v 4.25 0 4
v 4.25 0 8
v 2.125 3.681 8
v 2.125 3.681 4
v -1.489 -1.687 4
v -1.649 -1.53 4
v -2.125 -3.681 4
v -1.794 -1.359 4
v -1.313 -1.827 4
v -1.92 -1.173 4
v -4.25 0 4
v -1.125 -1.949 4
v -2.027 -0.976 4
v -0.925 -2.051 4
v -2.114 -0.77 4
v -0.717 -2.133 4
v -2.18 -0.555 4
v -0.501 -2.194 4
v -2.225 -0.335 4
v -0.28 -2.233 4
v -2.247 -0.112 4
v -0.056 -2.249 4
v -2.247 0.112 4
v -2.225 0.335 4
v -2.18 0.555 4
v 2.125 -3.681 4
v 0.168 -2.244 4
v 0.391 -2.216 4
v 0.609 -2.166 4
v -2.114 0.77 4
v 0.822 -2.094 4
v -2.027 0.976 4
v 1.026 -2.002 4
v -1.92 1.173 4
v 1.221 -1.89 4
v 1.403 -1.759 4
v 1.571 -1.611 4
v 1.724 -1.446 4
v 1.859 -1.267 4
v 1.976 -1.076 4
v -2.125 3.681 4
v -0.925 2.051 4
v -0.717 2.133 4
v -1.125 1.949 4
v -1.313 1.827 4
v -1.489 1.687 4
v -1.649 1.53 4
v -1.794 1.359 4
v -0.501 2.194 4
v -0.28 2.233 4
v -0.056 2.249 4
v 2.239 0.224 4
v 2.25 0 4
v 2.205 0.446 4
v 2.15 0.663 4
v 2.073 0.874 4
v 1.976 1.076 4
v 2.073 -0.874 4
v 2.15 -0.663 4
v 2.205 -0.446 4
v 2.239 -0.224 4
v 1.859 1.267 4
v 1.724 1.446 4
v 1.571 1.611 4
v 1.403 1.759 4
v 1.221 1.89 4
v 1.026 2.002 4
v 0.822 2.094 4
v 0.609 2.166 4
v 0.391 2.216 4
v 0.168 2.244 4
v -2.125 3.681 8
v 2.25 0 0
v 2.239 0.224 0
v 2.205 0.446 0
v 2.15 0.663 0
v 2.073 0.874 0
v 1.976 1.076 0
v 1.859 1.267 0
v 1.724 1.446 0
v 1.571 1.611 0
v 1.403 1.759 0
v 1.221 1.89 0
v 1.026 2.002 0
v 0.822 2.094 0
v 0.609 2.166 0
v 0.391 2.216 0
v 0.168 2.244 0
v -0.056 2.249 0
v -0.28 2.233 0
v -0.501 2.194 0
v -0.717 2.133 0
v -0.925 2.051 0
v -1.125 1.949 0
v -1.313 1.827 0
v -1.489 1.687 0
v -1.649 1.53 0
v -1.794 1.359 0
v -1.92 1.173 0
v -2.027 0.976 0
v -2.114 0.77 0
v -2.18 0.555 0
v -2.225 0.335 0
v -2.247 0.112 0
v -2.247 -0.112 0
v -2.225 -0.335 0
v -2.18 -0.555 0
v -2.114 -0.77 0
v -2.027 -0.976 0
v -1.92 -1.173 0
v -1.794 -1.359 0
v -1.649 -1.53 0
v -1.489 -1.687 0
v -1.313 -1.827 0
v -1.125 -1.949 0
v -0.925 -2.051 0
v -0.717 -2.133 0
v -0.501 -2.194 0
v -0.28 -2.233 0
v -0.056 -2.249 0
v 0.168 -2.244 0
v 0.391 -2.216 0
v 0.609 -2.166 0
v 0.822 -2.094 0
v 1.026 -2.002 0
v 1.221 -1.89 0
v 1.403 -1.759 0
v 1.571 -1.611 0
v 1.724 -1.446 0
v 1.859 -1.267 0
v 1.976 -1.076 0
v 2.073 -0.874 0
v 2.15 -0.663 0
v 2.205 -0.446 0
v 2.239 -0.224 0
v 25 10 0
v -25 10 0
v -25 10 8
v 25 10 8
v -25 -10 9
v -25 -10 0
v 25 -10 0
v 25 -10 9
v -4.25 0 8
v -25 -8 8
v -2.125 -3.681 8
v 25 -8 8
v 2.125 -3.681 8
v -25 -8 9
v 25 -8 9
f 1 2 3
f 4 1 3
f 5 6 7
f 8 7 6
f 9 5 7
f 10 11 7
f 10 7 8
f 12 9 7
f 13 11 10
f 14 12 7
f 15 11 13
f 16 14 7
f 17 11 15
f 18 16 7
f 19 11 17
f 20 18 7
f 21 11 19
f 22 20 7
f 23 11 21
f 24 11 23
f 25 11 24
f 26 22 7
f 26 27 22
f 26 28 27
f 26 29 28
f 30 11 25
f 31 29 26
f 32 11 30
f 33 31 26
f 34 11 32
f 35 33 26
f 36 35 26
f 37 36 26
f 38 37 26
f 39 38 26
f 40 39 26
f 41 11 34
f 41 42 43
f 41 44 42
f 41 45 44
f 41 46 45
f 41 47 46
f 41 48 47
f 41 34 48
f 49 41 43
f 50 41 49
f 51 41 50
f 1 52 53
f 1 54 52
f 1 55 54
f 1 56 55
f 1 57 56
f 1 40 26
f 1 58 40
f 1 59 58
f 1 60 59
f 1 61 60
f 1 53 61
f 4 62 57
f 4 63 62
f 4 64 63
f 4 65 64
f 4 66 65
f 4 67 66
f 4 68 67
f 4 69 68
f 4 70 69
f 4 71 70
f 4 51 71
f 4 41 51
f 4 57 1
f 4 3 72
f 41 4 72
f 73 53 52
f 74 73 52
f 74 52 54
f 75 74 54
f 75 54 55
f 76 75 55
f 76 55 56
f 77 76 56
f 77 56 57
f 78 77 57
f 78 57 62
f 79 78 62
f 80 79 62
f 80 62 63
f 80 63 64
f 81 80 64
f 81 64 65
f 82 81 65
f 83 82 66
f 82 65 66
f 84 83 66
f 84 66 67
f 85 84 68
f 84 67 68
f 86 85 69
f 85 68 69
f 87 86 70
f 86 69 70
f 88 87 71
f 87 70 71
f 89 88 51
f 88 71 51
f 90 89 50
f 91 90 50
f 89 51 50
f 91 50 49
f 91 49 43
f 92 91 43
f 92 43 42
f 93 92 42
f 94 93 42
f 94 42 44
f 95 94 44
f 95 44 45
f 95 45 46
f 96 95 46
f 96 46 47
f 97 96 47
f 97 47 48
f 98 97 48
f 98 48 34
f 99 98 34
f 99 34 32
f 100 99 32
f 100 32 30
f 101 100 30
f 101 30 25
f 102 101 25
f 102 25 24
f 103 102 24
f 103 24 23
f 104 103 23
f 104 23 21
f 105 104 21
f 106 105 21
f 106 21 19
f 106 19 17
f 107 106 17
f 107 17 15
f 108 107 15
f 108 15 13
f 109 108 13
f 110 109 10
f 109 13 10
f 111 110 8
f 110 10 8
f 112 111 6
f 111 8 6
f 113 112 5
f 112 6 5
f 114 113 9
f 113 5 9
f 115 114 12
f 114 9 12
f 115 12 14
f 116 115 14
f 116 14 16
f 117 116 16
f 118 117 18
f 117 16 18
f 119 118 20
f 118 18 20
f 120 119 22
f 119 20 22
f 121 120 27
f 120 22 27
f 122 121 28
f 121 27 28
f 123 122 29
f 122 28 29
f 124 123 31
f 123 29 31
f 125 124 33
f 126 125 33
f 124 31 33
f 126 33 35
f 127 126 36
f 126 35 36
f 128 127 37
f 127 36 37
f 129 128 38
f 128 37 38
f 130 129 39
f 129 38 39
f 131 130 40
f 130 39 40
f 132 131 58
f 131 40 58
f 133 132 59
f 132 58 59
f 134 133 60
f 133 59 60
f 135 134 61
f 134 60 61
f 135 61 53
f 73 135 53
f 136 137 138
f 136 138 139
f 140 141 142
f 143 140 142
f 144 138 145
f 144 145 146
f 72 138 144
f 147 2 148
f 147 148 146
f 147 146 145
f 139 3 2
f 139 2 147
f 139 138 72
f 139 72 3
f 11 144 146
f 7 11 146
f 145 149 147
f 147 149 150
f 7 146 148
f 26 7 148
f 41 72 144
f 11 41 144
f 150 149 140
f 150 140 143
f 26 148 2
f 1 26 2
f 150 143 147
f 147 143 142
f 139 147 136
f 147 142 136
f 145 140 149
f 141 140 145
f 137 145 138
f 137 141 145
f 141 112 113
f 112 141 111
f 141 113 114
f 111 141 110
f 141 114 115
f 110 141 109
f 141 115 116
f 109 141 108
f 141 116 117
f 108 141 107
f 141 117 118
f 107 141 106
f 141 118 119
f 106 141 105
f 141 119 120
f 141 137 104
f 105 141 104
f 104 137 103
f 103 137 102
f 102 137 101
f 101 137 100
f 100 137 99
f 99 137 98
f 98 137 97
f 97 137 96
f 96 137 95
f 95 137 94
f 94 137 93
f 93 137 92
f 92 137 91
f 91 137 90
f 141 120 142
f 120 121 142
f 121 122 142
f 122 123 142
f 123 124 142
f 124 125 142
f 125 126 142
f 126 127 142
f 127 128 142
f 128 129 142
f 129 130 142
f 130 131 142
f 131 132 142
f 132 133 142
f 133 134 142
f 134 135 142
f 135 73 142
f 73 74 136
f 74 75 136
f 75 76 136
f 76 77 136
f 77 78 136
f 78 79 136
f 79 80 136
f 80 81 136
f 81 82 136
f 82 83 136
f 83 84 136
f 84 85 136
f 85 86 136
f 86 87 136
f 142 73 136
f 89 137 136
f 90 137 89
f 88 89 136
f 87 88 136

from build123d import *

# Parameters (mm, degrees)
SKETCH_W        = 50
SKETCH_H        = 20
PAD_DEPTH       = 9
SKETCH001_R     = 2.25
POCKET_DEPTH    = 9
POCKET001_DEPTH = 5
SKETCH003_W     = 50
SKETCH003_H     = 18
POCKET002_DEPTH = 1


with BuildPart() as part:
    # Sketch → Pad (new body)
    with BuildSketch(Plane.XY):
        Rectangle(SKETCH_W, SKETCH_H)
    extrude(amount=PAD_DEPTH)

    # Sketch001 (on DatumPlane) → Pocket (cut)
    with BuildSketch(Plane.XY.offset(9)):
        Circle(SKETCH001_R)
    extrude(amount=-POCKET_DEPTH, mode=Mode.SUBTRACT)

    # Sketch002 (on DatumPlane) → Pocket001 (cut)
    with BuildSketch(Plane.XY.offset(9)):
        Polygon((2.125, -3.680608), (4.25, 0), (2.125, 3.680608), (-2.125, 3.680608), (-4.25, 0), (-2.125, -3.680608), align=None)
    extrude(amount=-POCKET001_DEPTH, mode=Mode.SUBTRACT)

    # Sketch003 (on DatumPlane) → Pocket002 (cut)
    with BuildSketch(Plane.XY.offset(9)):
        with Locations((0, 1)):
            Rectangle(SKETCH003_W, SKETCH003_H)
    extrude(amount=-POCKET002_DEPTH, mode=Mode.SUBTRACT)


solid = part.part
